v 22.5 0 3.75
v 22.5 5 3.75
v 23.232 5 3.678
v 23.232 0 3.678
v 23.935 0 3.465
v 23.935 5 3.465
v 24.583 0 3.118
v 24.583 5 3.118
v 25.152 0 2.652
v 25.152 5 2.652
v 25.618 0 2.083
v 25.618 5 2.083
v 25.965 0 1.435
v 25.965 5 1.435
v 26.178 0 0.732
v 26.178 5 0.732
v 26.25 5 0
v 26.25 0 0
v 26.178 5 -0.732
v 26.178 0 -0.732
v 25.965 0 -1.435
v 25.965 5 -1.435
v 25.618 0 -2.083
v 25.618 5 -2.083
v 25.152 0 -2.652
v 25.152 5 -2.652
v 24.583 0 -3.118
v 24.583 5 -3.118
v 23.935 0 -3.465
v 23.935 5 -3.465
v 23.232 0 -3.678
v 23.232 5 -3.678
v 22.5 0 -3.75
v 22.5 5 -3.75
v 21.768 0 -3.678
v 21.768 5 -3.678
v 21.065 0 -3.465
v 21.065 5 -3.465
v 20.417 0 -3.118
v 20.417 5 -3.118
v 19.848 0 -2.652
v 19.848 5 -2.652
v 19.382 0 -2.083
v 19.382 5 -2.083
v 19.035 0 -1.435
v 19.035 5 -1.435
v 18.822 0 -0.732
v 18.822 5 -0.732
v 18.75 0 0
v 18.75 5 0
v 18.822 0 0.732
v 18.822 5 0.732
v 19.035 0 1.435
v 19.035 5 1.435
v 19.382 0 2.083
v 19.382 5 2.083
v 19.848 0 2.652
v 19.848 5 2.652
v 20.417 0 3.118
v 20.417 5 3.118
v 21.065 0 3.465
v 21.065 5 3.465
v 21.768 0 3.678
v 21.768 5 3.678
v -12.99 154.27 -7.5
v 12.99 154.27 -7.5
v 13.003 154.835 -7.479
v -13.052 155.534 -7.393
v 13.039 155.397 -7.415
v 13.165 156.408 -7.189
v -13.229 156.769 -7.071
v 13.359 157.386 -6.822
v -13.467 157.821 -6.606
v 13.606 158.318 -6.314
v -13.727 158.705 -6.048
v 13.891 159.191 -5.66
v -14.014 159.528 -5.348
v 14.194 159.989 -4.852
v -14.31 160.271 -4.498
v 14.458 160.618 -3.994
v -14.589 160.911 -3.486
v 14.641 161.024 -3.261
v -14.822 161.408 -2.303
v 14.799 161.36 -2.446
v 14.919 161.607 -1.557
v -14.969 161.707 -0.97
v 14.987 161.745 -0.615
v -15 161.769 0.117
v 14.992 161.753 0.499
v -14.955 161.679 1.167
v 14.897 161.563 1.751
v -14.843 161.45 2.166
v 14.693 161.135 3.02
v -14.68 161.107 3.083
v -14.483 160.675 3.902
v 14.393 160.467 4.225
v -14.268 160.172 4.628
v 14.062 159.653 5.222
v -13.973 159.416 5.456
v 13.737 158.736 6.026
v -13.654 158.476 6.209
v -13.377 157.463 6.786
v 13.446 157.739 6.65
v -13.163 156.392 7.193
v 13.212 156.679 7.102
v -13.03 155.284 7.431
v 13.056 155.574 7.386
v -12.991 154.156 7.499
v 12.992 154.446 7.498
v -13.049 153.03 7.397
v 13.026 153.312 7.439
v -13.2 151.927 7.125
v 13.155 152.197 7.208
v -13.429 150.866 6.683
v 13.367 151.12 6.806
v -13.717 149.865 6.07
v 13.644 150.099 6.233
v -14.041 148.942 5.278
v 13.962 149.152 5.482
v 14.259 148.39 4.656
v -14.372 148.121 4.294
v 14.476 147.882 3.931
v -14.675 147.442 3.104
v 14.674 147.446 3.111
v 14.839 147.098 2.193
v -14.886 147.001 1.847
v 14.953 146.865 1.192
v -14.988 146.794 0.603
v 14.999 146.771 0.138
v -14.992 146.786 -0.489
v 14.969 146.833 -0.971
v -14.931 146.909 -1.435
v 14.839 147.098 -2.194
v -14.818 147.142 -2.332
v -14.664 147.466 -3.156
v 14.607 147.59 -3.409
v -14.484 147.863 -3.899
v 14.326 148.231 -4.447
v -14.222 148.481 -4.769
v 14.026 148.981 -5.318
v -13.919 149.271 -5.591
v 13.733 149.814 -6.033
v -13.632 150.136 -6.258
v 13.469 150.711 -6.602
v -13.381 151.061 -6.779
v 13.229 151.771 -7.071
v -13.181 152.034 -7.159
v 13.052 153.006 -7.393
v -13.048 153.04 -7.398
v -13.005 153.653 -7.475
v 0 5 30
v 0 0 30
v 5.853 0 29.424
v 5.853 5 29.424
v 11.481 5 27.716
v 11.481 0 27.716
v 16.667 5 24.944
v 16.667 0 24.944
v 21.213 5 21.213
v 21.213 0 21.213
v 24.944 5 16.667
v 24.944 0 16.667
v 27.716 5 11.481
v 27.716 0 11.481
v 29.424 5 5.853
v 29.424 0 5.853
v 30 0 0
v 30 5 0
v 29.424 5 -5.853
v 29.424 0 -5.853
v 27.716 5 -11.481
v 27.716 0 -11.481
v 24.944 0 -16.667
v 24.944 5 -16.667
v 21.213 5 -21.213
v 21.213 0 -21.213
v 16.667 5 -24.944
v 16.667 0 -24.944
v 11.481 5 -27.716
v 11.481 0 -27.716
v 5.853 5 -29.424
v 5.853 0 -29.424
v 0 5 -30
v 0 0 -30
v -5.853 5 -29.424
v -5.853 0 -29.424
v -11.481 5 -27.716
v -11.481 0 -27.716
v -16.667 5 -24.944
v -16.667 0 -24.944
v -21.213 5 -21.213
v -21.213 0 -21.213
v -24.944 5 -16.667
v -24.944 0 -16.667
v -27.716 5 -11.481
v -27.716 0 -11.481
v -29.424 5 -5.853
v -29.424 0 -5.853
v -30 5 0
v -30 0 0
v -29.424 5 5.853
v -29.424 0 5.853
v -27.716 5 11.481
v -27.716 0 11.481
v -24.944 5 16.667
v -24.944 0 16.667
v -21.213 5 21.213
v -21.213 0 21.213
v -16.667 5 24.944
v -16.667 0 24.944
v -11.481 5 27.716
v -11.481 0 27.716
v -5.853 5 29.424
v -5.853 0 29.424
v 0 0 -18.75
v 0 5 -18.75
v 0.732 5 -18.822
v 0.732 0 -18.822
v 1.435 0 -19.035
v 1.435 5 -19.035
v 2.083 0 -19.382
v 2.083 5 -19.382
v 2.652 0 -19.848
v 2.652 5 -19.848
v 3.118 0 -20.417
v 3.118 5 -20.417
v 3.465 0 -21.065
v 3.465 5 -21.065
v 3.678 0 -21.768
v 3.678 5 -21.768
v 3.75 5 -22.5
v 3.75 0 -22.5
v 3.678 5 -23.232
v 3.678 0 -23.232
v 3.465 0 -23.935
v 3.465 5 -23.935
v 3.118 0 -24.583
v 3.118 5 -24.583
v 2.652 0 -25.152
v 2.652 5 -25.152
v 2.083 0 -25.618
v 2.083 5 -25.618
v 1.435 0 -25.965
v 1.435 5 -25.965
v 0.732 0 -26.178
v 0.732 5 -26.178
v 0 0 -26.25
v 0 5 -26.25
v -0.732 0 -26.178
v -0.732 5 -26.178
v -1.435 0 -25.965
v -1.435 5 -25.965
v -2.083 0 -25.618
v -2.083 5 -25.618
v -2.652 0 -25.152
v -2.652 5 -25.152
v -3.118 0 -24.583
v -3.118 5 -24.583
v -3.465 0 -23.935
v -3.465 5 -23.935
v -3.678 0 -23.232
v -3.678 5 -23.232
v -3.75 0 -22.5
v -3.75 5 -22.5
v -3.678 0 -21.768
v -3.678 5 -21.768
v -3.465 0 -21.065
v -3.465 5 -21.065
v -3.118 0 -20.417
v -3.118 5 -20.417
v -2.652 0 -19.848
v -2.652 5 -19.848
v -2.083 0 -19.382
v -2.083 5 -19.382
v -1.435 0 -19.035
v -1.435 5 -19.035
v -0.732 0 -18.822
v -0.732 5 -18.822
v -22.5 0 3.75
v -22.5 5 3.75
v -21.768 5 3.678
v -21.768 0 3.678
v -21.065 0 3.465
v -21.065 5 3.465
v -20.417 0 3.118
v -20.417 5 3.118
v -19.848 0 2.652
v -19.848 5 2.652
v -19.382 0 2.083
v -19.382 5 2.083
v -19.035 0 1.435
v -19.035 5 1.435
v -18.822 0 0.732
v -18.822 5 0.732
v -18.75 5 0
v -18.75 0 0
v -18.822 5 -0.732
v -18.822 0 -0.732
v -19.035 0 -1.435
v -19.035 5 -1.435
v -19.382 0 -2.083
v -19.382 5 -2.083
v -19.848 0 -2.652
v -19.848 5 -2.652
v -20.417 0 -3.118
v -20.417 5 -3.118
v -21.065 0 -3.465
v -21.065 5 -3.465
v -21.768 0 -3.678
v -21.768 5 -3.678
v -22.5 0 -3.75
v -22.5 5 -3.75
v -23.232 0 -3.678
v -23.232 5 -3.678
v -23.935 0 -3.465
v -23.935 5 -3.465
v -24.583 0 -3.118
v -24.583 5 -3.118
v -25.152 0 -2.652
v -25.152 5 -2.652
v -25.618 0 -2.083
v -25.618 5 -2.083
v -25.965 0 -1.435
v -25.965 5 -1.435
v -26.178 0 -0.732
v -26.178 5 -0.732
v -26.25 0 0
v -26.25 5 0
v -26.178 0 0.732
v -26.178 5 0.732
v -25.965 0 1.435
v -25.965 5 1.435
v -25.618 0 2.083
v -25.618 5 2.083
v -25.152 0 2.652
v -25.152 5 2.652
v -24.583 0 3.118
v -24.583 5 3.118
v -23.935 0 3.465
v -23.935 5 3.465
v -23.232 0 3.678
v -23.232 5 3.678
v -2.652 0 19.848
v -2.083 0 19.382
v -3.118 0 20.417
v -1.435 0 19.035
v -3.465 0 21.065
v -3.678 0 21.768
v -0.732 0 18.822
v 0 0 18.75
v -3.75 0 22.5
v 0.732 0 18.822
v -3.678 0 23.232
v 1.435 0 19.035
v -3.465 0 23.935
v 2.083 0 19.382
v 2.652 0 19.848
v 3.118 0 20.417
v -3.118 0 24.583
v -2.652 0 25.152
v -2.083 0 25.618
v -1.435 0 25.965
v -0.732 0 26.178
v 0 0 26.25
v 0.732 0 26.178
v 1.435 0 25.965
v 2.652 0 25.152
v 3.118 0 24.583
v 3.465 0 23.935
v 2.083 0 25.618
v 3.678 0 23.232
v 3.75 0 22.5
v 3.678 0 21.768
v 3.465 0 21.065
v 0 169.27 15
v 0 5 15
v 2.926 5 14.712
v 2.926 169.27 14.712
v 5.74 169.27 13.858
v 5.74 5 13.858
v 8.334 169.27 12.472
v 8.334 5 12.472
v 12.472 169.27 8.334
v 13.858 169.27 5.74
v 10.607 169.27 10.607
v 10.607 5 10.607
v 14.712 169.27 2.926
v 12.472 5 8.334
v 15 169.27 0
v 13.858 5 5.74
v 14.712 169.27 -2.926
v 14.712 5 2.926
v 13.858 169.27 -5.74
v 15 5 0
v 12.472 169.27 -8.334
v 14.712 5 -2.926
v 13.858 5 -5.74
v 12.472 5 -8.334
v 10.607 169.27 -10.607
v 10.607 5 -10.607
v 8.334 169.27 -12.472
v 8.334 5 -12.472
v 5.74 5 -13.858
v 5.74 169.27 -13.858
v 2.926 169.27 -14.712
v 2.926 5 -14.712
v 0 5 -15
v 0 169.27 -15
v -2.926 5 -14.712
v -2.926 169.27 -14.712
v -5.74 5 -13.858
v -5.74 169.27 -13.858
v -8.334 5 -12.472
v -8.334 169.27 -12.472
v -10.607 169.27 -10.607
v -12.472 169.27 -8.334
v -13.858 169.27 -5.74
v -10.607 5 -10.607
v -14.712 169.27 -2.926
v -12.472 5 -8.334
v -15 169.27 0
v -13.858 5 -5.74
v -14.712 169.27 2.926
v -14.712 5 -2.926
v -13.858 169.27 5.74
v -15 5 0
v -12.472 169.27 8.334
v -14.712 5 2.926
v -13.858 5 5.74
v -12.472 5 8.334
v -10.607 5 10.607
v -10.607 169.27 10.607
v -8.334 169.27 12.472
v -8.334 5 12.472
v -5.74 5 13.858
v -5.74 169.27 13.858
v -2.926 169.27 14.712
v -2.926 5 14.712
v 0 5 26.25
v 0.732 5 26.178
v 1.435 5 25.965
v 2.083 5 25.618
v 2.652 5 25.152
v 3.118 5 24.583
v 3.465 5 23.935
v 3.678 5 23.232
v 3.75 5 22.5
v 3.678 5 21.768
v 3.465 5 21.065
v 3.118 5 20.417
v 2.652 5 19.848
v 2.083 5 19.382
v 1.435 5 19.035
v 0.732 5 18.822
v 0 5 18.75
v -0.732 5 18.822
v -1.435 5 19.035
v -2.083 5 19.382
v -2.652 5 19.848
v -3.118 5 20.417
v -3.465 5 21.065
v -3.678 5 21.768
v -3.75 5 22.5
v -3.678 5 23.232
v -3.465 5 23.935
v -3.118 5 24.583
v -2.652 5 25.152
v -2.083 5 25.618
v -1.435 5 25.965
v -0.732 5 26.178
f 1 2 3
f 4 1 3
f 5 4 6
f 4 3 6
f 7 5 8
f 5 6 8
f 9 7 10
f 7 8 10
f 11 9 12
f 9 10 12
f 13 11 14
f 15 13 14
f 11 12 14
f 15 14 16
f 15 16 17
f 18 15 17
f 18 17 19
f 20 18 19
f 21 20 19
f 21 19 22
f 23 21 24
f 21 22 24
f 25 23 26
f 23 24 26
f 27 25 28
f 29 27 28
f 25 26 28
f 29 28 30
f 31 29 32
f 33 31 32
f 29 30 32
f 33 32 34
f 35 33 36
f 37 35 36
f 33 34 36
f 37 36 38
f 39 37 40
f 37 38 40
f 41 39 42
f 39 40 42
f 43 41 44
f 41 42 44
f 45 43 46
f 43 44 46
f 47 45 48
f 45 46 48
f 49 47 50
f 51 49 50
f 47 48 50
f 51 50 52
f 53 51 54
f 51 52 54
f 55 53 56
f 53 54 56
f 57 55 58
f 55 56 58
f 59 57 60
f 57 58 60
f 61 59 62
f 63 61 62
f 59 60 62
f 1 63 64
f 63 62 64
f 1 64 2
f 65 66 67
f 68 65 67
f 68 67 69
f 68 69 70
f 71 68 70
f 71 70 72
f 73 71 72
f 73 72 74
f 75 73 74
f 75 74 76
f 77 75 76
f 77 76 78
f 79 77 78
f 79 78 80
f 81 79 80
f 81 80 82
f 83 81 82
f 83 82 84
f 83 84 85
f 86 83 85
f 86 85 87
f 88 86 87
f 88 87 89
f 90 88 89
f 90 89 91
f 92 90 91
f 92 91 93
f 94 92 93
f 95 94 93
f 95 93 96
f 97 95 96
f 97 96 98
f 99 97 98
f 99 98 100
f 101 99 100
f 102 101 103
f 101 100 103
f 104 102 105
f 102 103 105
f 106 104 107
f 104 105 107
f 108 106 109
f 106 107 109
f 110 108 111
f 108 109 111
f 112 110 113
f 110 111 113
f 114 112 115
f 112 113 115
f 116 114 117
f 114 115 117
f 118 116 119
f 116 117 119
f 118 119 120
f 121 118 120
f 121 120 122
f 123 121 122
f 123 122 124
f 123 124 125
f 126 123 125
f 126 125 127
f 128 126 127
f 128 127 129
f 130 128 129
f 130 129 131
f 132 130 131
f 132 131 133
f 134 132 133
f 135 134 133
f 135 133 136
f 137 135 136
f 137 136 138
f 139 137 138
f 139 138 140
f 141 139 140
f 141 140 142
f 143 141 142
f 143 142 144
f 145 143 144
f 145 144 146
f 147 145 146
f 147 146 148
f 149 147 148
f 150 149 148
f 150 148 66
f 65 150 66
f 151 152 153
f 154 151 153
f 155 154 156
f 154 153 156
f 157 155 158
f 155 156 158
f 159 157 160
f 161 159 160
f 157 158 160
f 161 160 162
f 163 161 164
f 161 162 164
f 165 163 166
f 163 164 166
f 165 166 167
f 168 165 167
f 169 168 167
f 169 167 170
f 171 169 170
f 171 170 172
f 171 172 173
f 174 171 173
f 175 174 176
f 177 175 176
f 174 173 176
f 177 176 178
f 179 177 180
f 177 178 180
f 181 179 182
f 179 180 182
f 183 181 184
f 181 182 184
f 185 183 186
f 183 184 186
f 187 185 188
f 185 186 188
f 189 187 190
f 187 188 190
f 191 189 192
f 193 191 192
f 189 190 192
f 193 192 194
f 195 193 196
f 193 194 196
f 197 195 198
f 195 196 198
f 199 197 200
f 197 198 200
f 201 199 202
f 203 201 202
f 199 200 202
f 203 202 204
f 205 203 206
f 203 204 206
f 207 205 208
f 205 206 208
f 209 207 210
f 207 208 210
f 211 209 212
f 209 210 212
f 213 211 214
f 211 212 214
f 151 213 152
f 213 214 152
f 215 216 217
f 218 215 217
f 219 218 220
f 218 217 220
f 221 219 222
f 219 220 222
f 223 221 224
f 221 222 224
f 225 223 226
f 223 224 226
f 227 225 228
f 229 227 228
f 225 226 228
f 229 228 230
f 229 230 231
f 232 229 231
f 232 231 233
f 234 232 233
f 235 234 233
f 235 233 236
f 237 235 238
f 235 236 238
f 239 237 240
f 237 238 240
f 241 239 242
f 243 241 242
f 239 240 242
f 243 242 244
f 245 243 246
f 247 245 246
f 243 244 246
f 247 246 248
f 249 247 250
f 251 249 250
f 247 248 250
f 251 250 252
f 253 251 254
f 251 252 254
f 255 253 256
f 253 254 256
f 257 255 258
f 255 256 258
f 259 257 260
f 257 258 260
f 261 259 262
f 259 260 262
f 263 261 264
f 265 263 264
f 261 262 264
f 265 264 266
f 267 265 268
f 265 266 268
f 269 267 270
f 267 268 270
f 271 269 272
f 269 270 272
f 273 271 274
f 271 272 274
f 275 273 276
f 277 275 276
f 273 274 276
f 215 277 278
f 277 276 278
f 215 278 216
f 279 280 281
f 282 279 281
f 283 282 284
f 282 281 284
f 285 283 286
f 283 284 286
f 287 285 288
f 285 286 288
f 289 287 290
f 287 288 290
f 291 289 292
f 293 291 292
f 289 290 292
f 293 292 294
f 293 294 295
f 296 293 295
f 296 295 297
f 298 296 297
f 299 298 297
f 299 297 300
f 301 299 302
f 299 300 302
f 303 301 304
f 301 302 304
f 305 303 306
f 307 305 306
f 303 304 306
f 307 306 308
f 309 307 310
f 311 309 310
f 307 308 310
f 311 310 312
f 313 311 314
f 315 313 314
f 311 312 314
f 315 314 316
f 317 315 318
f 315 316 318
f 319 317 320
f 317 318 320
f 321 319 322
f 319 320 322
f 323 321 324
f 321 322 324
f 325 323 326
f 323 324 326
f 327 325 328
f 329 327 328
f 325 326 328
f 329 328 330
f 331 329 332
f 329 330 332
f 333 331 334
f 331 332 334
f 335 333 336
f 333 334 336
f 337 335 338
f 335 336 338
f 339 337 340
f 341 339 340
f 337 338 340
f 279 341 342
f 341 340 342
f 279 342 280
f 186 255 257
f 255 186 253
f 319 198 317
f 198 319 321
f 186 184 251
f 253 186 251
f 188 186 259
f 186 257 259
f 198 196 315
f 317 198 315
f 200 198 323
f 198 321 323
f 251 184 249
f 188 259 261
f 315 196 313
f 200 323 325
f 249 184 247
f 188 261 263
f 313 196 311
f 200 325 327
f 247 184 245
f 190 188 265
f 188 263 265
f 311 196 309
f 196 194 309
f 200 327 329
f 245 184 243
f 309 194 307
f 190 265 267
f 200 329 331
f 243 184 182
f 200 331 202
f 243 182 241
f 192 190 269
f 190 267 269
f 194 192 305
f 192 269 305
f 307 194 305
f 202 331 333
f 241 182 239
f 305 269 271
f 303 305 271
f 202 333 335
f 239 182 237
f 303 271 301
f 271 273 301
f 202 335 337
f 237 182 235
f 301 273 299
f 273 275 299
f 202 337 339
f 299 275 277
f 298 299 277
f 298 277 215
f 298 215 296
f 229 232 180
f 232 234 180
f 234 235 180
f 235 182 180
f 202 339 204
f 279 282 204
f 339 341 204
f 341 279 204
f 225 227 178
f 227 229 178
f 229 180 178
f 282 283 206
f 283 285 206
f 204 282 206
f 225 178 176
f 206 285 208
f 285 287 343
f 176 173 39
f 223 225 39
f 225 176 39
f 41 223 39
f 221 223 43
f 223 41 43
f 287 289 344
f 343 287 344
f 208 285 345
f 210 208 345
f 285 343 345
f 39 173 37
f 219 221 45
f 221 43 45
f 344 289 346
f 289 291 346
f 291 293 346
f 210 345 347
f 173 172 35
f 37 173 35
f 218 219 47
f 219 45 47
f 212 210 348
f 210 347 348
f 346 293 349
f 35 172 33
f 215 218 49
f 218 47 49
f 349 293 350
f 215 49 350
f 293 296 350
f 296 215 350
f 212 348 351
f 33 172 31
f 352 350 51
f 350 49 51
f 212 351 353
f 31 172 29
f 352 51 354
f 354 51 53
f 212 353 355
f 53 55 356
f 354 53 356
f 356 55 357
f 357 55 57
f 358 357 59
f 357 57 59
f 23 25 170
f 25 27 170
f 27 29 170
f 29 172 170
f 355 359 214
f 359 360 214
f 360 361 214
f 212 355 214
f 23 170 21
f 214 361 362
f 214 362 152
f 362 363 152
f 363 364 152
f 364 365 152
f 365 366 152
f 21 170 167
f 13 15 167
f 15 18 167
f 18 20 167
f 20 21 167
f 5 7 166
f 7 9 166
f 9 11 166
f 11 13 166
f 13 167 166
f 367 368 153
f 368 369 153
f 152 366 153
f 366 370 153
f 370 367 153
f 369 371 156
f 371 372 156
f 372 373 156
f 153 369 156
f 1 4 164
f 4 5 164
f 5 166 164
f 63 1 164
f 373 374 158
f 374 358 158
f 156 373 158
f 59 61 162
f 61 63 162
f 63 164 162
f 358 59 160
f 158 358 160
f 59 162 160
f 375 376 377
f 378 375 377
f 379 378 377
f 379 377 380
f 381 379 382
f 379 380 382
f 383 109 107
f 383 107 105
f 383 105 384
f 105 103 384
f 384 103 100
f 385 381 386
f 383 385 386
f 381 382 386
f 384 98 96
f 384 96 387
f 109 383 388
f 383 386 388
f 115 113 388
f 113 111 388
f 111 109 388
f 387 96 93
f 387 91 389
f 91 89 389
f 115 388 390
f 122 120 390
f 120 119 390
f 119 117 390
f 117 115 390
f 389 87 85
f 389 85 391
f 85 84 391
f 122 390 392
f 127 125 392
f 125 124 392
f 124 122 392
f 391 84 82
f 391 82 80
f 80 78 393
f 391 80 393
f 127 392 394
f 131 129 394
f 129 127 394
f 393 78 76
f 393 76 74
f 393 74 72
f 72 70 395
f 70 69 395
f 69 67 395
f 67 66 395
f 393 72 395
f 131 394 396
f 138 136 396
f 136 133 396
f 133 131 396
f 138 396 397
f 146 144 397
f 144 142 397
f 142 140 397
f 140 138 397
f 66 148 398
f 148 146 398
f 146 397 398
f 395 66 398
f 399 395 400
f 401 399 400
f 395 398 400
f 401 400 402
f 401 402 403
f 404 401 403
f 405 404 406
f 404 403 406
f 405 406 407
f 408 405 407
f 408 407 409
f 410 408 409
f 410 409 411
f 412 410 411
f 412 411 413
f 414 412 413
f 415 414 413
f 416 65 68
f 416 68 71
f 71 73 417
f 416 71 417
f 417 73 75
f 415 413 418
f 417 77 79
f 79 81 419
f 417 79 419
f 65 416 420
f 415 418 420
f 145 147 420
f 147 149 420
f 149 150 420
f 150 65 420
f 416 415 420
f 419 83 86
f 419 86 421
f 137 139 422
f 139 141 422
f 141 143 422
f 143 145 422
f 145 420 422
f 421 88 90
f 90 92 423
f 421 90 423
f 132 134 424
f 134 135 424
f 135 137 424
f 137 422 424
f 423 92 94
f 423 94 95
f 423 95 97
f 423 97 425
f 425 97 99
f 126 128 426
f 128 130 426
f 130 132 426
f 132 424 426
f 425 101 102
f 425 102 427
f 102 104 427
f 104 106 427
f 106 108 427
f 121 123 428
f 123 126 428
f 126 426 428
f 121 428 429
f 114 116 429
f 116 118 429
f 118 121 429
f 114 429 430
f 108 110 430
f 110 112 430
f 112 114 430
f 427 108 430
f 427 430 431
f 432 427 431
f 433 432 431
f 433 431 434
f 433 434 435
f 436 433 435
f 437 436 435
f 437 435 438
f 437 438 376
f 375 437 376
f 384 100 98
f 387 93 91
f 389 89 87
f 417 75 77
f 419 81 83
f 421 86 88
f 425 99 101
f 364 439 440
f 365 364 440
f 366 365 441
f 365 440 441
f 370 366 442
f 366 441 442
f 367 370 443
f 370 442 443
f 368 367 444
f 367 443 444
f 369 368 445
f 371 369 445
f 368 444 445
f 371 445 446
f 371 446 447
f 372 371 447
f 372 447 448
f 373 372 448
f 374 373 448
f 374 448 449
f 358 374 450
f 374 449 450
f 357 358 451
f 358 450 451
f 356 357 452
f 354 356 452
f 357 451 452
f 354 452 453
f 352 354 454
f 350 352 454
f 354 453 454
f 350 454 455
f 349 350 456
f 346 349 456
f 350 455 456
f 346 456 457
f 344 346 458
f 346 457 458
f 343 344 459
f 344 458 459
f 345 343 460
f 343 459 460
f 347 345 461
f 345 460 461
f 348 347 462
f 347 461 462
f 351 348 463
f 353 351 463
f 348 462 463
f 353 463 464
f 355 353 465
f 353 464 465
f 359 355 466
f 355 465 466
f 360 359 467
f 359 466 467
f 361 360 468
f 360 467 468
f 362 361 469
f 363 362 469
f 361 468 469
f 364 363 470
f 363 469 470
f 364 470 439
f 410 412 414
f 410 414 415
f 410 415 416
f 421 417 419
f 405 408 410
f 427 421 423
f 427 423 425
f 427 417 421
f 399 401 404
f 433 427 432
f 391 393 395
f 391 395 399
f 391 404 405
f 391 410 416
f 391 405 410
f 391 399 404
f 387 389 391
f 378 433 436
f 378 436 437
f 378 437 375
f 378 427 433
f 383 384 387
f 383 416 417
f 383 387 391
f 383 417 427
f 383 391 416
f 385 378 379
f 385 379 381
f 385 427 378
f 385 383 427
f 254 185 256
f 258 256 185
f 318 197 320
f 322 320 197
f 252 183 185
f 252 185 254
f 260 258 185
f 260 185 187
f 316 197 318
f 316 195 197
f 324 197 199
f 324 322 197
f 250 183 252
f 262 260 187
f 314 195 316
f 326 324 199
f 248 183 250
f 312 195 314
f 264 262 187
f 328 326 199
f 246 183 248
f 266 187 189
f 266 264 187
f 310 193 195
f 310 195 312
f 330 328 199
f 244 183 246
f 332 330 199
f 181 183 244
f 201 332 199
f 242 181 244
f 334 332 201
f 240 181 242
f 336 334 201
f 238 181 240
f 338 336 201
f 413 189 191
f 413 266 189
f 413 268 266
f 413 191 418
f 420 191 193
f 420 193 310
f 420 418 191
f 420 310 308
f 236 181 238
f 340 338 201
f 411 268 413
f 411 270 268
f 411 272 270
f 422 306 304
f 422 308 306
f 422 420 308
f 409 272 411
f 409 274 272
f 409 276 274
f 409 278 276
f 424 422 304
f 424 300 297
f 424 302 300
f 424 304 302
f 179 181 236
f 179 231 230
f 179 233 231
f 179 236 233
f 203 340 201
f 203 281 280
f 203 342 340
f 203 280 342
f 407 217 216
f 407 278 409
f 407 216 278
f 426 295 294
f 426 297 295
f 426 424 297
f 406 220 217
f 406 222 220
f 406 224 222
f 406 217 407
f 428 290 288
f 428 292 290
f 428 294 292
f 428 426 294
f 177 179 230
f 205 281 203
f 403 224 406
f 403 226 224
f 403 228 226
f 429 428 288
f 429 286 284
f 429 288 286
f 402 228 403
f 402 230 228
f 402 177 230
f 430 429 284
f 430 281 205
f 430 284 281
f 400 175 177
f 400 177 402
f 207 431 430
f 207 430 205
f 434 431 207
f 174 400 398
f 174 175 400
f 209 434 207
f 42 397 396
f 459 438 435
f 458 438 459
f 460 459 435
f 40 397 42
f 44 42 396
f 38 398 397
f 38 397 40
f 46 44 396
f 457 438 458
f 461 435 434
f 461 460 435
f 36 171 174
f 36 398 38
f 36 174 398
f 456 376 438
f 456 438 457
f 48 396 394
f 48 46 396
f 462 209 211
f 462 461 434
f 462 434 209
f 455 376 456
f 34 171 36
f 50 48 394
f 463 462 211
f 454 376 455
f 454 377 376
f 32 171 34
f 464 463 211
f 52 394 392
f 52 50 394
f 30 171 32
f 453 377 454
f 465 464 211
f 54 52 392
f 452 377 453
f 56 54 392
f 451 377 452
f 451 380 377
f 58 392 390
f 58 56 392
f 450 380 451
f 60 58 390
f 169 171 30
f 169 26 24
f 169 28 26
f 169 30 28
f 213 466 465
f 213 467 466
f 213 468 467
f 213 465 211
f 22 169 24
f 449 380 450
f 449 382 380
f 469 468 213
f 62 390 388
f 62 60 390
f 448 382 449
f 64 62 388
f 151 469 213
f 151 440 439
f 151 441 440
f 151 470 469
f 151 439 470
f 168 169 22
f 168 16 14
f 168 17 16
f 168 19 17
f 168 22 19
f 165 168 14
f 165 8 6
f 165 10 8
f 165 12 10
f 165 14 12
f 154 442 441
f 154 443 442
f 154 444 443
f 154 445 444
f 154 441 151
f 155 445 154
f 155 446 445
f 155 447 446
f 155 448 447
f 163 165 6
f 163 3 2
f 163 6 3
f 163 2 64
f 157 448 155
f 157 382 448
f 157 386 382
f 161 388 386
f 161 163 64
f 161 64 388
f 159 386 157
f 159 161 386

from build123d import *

# Parameters (mm, degrees)
SKETCH1_R           = 30
BOSS_EXTRUDE1_DEPTH = 5
SKETCH2_R           = 3.75
CUT_EXTRUDE1_DEPTH  = 5
SKETCH3_R           = 15
BOSS_EXTRUDE2_DEPTH = 164.27
SKETCH4_R           = 7.5
CUT_EXTRUDE2_DEPTH  = 178.700120709


with BuildPart() as part:
    # Sketch1 → Boss-Extrude1 (new body)
    with BuildSketch(Plane(origin=(0, 0, 0), x_dir=(1, 0, 0), z_dir=(0, 1, 0))):
        with Locations(Location((0, 0, 0), (0, 0, 270))):
            Circle(SKETCH1_R)
    extrude(amount=BOSS_EXTRUDE1_DEPTH)

    # Sketch2 → Cut-Extrude1 (cut)
    with BuildSketch(Plane(origin=(0, 5, 0), x_dir=(1, 0, 0), z_dir=(0, 1, 0))):
        with Locations(Location((0, 22.5, 0), (0, 0, 270))):
            Circle(SKETCH2_R)
        with Locations(Location((22.5, 0, 0), (0, 0, 270))):
            Circle(SKETCH2_R)
        with Locations(Location((0, -22.5, 0), (0, 0, 270))):
            Circle(SKETCH2_R)
        with Locations(Location((-22.5, 0, 0), (0, 0, 270))):
            Circle(SKETCH2_R)
    extrude(amount=-CUT_EXTRUDE1_DEPTH, mode=Mode.SUBTRACT)

    # Sketch3 → Boss-Extrude2 (add)
    with BuildSketch(Plane(origin=(0, 5, 0), x_dir=(1, 0, 0), z_dir=(0, 1, 0))):
        with Locations(Location((0, 0, 0), (0, 0, 270))):
            Circle(SKETCH3_R)
    extrude(amount=BOSS_EXTRUDE2_DEPTH)

    # Sketch4 → Cut-Extrude2 (cut, through all)
    with BuildSketch(Plane(origin=(15, 0, 0), x_dir=(0, 0, -1), z_dir=(1, 0, 0))):
        with Locations((0, 154.27)):
            Circle(SKETCH4_R)
    extrude(amount=-CUT_EXTRUDE2_DEPTH, mode=Mode.SUBTRACT)


solid = part.part
